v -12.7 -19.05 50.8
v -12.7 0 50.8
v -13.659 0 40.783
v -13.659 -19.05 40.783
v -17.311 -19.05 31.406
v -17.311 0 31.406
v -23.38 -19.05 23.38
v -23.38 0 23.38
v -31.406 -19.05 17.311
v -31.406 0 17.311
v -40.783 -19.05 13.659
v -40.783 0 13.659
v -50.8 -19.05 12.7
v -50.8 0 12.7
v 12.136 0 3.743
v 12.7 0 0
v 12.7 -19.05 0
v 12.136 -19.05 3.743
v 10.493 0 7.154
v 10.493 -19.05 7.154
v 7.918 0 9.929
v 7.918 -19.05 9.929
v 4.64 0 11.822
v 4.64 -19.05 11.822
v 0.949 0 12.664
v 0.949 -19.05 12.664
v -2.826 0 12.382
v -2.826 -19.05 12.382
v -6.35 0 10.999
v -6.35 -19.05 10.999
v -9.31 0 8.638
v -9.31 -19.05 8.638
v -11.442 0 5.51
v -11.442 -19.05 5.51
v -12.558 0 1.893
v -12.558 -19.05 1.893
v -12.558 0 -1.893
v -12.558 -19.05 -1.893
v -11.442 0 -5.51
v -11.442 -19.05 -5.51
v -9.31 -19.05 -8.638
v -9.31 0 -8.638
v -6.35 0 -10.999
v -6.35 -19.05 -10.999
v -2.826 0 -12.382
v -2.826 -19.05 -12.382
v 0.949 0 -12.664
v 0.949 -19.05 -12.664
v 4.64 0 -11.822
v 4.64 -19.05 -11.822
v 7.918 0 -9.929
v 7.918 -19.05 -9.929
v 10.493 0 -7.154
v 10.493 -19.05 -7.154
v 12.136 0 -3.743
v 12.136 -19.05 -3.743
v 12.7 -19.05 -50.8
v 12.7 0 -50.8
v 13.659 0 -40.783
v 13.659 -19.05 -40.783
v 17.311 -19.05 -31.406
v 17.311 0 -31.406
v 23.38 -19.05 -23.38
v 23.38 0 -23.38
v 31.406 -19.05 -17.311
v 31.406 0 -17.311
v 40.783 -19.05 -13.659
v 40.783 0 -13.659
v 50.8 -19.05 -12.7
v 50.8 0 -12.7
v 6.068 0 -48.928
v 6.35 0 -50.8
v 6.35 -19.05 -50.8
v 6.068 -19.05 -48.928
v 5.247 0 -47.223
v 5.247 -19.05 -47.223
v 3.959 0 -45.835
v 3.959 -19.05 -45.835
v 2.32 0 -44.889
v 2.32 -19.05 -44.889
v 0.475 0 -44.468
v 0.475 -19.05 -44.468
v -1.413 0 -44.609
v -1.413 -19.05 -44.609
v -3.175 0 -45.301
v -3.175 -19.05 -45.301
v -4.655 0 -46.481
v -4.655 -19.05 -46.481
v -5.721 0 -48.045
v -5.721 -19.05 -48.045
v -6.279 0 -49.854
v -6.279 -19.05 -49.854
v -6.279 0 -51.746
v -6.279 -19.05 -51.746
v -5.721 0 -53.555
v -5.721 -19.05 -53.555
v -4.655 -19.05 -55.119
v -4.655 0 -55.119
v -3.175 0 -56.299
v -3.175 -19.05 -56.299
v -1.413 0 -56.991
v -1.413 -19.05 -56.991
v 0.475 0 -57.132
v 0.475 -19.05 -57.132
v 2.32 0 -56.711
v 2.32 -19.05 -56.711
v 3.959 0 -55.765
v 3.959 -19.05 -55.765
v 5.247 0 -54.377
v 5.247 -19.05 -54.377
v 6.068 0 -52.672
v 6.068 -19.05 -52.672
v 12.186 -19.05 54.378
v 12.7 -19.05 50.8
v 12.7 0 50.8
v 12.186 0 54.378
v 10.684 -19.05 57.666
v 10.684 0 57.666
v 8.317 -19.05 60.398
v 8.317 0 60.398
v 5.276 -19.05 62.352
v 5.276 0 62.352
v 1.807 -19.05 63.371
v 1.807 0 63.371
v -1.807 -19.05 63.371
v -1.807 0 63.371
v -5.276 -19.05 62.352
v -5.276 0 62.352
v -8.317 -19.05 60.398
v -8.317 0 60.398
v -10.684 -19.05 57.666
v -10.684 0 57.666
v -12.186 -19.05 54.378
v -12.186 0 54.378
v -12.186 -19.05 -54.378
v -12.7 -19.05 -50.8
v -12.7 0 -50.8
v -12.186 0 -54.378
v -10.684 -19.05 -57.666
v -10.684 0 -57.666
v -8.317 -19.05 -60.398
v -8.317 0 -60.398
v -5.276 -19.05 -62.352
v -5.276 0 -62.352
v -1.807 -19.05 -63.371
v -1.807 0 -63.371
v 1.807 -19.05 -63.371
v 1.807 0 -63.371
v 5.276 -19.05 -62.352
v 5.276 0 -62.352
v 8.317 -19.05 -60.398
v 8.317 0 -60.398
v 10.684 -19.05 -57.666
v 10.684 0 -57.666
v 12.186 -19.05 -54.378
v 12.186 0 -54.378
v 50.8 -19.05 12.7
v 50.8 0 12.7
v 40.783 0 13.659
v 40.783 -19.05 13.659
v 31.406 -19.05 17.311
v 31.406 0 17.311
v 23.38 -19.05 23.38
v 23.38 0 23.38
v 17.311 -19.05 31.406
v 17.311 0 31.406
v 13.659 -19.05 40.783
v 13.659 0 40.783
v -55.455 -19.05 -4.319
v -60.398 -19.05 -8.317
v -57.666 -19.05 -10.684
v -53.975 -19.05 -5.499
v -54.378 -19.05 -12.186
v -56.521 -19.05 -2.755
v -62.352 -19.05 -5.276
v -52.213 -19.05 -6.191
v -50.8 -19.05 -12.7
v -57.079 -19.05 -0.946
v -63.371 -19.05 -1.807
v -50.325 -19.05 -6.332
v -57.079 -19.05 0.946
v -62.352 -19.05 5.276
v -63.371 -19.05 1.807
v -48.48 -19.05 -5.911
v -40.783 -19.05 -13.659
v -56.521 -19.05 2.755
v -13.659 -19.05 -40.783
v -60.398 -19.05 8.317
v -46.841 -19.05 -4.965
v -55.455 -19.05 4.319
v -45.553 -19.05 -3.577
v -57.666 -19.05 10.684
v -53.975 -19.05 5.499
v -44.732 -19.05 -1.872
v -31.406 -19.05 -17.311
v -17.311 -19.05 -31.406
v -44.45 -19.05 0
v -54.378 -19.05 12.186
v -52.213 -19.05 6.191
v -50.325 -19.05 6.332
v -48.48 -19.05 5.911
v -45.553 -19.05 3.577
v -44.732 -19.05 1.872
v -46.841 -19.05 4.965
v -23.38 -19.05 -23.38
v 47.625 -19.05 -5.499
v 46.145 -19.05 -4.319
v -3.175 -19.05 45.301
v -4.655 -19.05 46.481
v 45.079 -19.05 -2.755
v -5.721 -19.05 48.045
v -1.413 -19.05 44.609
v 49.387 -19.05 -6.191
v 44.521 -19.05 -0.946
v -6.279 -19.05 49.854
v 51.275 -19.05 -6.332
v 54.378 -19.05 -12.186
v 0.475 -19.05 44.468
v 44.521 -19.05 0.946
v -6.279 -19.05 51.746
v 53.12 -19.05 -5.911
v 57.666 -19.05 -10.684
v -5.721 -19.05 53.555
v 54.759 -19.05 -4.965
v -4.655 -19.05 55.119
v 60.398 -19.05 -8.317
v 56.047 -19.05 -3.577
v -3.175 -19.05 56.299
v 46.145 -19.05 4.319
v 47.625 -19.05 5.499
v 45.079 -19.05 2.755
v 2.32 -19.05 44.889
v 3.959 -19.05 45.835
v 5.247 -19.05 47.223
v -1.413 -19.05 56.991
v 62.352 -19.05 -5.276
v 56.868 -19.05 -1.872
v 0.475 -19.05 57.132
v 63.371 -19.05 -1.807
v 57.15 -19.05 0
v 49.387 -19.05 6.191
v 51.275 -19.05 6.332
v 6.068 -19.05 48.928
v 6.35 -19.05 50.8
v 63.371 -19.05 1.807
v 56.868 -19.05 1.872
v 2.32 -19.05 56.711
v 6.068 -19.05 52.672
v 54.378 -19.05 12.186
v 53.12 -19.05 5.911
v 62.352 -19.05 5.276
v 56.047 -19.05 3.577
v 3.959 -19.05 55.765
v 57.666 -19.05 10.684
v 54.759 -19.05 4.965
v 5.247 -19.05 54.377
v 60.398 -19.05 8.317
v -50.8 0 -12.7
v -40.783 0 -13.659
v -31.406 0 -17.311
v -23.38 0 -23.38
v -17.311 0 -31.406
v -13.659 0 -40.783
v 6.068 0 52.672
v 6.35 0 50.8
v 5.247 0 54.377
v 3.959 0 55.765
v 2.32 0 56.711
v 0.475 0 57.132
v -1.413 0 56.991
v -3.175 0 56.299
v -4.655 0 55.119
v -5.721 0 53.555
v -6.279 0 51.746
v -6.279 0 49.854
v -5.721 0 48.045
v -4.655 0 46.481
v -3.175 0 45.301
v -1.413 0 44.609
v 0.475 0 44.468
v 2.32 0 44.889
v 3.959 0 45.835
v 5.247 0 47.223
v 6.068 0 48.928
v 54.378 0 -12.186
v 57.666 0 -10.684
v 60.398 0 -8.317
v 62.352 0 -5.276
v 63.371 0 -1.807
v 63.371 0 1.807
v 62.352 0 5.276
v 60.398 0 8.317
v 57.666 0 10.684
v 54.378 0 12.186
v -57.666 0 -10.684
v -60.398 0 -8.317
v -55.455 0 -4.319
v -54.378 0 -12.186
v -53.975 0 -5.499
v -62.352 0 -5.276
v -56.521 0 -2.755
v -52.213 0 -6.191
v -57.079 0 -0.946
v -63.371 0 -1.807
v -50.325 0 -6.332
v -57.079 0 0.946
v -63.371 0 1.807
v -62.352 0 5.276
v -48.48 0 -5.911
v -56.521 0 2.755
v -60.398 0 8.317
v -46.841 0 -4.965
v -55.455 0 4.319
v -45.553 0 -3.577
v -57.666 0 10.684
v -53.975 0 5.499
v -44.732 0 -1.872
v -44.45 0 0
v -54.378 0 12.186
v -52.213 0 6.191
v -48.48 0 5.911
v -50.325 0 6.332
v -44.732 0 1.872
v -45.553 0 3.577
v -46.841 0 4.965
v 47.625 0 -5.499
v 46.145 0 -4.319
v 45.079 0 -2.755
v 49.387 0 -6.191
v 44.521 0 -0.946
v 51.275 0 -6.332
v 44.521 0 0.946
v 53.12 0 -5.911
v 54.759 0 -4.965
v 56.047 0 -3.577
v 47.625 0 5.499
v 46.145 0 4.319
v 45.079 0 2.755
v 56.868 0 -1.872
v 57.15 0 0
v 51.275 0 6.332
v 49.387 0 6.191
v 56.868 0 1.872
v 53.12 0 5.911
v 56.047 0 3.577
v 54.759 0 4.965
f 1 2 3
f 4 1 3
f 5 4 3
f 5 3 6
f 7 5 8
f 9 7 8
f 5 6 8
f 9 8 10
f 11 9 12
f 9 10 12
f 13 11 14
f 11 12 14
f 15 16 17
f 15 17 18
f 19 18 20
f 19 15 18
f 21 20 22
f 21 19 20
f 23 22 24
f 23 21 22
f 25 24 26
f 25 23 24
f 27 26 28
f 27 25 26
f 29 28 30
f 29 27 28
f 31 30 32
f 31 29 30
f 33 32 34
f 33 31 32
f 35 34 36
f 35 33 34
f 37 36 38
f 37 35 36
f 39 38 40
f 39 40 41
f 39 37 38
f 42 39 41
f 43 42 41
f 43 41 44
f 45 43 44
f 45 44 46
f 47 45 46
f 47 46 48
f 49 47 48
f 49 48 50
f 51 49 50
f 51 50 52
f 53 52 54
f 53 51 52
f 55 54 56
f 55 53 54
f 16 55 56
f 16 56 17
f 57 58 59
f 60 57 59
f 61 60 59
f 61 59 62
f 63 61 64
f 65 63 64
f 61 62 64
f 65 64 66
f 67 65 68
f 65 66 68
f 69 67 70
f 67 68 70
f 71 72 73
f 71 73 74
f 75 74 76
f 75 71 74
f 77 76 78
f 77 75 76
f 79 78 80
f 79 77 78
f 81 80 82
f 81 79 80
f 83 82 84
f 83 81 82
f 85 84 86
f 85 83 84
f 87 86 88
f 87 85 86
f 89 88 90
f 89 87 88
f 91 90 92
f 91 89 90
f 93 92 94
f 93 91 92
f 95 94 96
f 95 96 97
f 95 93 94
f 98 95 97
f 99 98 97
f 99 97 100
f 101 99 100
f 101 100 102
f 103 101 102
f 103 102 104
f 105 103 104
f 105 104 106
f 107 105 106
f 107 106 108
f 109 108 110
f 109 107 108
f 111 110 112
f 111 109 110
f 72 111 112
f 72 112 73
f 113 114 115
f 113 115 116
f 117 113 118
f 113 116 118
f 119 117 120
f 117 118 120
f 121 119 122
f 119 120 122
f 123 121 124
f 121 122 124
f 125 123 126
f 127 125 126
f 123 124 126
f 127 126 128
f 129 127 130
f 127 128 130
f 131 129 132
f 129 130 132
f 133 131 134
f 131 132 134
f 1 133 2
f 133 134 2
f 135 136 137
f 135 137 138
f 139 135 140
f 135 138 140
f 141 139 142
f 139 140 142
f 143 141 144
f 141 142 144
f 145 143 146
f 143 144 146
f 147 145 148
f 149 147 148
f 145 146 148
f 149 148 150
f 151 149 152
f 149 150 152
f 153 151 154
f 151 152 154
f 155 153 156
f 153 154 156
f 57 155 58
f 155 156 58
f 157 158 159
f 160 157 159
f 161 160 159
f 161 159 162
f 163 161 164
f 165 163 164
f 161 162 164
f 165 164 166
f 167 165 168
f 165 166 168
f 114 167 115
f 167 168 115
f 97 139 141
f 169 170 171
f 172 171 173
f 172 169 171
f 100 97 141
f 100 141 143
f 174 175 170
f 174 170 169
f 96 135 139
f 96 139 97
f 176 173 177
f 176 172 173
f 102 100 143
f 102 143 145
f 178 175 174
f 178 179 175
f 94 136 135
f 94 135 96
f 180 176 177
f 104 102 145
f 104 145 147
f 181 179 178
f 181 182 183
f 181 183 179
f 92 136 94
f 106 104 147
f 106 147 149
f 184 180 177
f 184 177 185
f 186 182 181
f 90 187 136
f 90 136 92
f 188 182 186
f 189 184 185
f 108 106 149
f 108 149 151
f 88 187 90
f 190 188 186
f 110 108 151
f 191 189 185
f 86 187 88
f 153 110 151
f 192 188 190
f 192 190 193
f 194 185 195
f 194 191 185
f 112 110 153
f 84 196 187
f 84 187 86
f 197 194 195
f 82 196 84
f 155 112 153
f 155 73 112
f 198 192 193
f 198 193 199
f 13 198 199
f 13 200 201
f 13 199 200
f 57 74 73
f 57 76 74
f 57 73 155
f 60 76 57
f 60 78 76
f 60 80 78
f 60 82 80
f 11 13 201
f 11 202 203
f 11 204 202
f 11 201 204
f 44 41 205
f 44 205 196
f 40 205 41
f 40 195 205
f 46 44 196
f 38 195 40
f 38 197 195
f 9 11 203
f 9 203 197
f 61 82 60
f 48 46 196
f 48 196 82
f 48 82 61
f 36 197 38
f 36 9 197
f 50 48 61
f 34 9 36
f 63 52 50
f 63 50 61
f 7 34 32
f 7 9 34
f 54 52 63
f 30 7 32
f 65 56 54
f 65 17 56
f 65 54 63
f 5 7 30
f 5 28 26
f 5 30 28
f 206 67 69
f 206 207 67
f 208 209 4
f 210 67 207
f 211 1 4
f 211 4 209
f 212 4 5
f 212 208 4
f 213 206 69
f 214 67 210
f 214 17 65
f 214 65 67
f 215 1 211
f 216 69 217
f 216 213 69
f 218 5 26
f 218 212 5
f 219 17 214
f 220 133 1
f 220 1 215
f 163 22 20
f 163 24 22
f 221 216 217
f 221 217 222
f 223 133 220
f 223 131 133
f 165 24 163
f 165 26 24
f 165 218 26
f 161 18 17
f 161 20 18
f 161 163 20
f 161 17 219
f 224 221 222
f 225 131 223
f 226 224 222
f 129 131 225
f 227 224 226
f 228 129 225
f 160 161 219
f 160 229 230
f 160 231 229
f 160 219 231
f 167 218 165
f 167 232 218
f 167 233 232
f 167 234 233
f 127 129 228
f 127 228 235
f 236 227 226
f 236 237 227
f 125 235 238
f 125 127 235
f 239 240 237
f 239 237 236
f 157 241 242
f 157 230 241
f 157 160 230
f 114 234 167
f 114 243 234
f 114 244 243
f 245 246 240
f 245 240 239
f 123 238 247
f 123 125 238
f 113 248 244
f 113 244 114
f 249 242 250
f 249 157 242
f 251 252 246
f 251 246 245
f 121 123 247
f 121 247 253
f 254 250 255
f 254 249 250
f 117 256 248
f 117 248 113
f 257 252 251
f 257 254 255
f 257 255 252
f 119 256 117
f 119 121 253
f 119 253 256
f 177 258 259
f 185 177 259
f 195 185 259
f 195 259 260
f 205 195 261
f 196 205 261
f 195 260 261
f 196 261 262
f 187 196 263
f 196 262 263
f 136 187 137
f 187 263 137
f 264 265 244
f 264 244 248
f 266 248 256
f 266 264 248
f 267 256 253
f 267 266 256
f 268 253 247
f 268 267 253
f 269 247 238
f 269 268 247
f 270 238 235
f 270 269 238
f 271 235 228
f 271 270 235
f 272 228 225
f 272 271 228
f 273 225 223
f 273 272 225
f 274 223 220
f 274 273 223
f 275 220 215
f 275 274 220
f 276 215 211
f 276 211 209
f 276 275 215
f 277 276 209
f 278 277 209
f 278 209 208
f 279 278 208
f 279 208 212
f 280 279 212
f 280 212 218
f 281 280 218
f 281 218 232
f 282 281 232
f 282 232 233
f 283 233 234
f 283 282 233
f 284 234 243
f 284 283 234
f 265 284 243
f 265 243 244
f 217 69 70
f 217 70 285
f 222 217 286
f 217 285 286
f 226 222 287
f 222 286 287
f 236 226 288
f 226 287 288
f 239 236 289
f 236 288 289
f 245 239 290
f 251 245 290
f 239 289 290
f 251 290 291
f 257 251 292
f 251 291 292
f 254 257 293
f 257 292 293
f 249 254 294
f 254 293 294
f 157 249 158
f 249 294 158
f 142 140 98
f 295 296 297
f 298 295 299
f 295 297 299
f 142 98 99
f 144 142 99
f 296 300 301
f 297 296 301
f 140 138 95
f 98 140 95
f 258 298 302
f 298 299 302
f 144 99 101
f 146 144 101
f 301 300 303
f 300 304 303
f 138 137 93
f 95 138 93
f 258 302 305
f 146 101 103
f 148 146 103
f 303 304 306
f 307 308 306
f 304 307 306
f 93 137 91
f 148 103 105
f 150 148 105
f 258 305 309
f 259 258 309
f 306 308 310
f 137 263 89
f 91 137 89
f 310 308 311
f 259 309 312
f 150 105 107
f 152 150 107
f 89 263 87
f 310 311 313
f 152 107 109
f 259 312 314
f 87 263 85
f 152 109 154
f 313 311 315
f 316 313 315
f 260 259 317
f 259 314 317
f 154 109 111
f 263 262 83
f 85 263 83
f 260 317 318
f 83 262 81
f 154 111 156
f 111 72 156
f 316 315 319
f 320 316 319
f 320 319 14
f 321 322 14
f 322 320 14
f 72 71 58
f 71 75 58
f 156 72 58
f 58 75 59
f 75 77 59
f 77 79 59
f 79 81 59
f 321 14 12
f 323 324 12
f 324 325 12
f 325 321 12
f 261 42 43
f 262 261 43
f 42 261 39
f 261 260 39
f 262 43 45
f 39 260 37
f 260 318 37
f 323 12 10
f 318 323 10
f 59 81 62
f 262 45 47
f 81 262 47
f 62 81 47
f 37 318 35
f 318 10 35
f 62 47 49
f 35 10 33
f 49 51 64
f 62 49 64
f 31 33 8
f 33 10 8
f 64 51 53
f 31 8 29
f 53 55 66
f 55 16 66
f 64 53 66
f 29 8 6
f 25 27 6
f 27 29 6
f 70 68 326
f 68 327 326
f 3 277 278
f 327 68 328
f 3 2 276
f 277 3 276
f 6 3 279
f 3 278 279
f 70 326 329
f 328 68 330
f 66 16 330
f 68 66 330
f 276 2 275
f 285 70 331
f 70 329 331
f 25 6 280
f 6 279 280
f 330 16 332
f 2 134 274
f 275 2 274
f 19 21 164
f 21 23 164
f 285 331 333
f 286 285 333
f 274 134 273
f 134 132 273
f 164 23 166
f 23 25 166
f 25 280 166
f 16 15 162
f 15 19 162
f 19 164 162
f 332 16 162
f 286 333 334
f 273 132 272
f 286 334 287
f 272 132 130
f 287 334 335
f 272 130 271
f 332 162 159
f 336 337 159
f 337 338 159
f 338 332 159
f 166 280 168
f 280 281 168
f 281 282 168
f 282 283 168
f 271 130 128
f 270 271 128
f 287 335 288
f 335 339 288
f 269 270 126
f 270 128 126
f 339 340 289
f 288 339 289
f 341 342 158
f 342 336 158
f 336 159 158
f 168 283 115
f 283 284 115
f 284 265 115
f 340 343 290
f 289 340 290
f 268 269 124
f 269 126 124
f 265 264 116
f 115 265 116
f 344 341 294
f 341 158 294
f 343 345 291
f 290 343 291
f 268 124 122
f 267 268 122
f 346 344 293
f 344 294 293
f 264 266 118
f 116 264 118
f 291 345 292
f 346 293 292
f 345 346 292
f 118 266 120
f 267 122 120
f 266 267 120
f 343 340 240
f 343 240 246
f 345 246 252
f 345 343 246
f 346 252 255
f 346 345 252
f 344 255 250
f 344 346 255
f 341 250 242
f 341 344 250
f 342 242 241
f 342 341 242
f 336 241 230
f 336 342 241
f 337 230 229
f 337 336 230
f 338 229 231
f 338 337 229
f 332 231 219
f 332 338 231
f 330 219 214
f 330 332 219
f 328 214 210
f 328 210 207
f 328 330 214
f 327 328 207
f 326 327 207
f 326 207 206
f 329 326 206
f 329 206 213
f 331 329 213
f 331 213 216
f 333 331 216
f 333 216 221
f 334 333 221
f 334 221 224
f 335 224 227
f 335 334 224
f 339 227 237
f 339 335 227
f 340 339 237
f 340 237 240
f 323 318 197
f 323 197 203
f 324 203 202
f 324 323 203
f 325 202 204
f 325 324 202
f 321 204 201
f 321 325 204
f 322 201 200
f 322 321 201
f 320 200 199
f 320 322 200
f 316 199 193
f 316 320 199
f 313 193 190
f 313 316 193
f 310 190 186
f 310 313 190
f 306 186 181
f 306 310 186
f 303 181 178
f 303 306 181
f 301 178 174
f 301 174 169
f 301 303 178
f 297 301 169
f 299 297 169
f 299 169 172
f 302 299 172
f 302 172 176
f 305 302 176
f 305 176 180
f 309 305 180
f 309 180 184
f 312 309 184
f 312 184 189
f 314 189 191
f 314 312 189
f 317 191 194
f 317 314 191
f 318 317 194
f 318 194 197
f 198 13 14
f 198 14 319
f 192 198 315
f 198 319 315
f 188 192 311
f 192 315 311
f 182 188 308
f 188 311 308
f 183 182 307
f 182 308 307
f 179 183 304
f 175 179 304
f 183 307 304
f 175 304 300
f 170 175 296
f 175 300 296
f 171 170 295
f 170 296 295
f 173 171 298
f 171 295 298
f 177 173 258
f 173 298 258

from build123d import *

# Parameters (mm, degrees)
F0_R     = 6.35
F0_R_2   = 12.7
F1_DEPTH = 19.05


with BuildPart() as f1:
    # F0 (on Front) → F1 (new body)
    with BuildSketch(Plane.XZ):
        with BuildLine():
            ThreePointArc((50.8, 12.7), (23.379701, 23.379701), (12.7, 50.8))
            ThreePointArc((12.7, 50.8), (0, 63.5), (-12.7, 50.8))
            ThreePointArc((-12.7, 50.8), (-23.379701, 23.379701), (-50.8, 12.7))
            ThreePointArc((-50.8, 12.7), (-63.5, 0), (-50.8, -12.7))
            ThreePointArc((-50.8, -12.7), (-23.379701, -23.379701), (-12.7, -50.8))
            ThreePointArc((-12.7, -50.8), (0, -63.5), (12.7, -50.8))
            ThreePointArc((12.7, -50.8), (23.379701, -23.379701), (50.8, -12.7))
            ThreePointArc((50.8, -12.7), (63.5, 0), (50.8, 12.7))
        make_face()
        with Locations((0, -50.8)):
            Circle(F0_R, mode=Mode.SUBTRACT)
        with Locations((-50.8, 0)):
            Circle(F0_R, mode=Mode.SUBTRACT)
        Circle(F0_R_2, mode=Mode.SUBTRACT)
        with Locations((50.8, 0)):
            Circle(F0_R, mode=Mode.SUBTRACT)
        with Locations((0, 50.8)):
            Circle(F0_R, mode=Mode.SUBTRACT)
    extrude(amount=F1_DEPTH)


solid = f1.part
